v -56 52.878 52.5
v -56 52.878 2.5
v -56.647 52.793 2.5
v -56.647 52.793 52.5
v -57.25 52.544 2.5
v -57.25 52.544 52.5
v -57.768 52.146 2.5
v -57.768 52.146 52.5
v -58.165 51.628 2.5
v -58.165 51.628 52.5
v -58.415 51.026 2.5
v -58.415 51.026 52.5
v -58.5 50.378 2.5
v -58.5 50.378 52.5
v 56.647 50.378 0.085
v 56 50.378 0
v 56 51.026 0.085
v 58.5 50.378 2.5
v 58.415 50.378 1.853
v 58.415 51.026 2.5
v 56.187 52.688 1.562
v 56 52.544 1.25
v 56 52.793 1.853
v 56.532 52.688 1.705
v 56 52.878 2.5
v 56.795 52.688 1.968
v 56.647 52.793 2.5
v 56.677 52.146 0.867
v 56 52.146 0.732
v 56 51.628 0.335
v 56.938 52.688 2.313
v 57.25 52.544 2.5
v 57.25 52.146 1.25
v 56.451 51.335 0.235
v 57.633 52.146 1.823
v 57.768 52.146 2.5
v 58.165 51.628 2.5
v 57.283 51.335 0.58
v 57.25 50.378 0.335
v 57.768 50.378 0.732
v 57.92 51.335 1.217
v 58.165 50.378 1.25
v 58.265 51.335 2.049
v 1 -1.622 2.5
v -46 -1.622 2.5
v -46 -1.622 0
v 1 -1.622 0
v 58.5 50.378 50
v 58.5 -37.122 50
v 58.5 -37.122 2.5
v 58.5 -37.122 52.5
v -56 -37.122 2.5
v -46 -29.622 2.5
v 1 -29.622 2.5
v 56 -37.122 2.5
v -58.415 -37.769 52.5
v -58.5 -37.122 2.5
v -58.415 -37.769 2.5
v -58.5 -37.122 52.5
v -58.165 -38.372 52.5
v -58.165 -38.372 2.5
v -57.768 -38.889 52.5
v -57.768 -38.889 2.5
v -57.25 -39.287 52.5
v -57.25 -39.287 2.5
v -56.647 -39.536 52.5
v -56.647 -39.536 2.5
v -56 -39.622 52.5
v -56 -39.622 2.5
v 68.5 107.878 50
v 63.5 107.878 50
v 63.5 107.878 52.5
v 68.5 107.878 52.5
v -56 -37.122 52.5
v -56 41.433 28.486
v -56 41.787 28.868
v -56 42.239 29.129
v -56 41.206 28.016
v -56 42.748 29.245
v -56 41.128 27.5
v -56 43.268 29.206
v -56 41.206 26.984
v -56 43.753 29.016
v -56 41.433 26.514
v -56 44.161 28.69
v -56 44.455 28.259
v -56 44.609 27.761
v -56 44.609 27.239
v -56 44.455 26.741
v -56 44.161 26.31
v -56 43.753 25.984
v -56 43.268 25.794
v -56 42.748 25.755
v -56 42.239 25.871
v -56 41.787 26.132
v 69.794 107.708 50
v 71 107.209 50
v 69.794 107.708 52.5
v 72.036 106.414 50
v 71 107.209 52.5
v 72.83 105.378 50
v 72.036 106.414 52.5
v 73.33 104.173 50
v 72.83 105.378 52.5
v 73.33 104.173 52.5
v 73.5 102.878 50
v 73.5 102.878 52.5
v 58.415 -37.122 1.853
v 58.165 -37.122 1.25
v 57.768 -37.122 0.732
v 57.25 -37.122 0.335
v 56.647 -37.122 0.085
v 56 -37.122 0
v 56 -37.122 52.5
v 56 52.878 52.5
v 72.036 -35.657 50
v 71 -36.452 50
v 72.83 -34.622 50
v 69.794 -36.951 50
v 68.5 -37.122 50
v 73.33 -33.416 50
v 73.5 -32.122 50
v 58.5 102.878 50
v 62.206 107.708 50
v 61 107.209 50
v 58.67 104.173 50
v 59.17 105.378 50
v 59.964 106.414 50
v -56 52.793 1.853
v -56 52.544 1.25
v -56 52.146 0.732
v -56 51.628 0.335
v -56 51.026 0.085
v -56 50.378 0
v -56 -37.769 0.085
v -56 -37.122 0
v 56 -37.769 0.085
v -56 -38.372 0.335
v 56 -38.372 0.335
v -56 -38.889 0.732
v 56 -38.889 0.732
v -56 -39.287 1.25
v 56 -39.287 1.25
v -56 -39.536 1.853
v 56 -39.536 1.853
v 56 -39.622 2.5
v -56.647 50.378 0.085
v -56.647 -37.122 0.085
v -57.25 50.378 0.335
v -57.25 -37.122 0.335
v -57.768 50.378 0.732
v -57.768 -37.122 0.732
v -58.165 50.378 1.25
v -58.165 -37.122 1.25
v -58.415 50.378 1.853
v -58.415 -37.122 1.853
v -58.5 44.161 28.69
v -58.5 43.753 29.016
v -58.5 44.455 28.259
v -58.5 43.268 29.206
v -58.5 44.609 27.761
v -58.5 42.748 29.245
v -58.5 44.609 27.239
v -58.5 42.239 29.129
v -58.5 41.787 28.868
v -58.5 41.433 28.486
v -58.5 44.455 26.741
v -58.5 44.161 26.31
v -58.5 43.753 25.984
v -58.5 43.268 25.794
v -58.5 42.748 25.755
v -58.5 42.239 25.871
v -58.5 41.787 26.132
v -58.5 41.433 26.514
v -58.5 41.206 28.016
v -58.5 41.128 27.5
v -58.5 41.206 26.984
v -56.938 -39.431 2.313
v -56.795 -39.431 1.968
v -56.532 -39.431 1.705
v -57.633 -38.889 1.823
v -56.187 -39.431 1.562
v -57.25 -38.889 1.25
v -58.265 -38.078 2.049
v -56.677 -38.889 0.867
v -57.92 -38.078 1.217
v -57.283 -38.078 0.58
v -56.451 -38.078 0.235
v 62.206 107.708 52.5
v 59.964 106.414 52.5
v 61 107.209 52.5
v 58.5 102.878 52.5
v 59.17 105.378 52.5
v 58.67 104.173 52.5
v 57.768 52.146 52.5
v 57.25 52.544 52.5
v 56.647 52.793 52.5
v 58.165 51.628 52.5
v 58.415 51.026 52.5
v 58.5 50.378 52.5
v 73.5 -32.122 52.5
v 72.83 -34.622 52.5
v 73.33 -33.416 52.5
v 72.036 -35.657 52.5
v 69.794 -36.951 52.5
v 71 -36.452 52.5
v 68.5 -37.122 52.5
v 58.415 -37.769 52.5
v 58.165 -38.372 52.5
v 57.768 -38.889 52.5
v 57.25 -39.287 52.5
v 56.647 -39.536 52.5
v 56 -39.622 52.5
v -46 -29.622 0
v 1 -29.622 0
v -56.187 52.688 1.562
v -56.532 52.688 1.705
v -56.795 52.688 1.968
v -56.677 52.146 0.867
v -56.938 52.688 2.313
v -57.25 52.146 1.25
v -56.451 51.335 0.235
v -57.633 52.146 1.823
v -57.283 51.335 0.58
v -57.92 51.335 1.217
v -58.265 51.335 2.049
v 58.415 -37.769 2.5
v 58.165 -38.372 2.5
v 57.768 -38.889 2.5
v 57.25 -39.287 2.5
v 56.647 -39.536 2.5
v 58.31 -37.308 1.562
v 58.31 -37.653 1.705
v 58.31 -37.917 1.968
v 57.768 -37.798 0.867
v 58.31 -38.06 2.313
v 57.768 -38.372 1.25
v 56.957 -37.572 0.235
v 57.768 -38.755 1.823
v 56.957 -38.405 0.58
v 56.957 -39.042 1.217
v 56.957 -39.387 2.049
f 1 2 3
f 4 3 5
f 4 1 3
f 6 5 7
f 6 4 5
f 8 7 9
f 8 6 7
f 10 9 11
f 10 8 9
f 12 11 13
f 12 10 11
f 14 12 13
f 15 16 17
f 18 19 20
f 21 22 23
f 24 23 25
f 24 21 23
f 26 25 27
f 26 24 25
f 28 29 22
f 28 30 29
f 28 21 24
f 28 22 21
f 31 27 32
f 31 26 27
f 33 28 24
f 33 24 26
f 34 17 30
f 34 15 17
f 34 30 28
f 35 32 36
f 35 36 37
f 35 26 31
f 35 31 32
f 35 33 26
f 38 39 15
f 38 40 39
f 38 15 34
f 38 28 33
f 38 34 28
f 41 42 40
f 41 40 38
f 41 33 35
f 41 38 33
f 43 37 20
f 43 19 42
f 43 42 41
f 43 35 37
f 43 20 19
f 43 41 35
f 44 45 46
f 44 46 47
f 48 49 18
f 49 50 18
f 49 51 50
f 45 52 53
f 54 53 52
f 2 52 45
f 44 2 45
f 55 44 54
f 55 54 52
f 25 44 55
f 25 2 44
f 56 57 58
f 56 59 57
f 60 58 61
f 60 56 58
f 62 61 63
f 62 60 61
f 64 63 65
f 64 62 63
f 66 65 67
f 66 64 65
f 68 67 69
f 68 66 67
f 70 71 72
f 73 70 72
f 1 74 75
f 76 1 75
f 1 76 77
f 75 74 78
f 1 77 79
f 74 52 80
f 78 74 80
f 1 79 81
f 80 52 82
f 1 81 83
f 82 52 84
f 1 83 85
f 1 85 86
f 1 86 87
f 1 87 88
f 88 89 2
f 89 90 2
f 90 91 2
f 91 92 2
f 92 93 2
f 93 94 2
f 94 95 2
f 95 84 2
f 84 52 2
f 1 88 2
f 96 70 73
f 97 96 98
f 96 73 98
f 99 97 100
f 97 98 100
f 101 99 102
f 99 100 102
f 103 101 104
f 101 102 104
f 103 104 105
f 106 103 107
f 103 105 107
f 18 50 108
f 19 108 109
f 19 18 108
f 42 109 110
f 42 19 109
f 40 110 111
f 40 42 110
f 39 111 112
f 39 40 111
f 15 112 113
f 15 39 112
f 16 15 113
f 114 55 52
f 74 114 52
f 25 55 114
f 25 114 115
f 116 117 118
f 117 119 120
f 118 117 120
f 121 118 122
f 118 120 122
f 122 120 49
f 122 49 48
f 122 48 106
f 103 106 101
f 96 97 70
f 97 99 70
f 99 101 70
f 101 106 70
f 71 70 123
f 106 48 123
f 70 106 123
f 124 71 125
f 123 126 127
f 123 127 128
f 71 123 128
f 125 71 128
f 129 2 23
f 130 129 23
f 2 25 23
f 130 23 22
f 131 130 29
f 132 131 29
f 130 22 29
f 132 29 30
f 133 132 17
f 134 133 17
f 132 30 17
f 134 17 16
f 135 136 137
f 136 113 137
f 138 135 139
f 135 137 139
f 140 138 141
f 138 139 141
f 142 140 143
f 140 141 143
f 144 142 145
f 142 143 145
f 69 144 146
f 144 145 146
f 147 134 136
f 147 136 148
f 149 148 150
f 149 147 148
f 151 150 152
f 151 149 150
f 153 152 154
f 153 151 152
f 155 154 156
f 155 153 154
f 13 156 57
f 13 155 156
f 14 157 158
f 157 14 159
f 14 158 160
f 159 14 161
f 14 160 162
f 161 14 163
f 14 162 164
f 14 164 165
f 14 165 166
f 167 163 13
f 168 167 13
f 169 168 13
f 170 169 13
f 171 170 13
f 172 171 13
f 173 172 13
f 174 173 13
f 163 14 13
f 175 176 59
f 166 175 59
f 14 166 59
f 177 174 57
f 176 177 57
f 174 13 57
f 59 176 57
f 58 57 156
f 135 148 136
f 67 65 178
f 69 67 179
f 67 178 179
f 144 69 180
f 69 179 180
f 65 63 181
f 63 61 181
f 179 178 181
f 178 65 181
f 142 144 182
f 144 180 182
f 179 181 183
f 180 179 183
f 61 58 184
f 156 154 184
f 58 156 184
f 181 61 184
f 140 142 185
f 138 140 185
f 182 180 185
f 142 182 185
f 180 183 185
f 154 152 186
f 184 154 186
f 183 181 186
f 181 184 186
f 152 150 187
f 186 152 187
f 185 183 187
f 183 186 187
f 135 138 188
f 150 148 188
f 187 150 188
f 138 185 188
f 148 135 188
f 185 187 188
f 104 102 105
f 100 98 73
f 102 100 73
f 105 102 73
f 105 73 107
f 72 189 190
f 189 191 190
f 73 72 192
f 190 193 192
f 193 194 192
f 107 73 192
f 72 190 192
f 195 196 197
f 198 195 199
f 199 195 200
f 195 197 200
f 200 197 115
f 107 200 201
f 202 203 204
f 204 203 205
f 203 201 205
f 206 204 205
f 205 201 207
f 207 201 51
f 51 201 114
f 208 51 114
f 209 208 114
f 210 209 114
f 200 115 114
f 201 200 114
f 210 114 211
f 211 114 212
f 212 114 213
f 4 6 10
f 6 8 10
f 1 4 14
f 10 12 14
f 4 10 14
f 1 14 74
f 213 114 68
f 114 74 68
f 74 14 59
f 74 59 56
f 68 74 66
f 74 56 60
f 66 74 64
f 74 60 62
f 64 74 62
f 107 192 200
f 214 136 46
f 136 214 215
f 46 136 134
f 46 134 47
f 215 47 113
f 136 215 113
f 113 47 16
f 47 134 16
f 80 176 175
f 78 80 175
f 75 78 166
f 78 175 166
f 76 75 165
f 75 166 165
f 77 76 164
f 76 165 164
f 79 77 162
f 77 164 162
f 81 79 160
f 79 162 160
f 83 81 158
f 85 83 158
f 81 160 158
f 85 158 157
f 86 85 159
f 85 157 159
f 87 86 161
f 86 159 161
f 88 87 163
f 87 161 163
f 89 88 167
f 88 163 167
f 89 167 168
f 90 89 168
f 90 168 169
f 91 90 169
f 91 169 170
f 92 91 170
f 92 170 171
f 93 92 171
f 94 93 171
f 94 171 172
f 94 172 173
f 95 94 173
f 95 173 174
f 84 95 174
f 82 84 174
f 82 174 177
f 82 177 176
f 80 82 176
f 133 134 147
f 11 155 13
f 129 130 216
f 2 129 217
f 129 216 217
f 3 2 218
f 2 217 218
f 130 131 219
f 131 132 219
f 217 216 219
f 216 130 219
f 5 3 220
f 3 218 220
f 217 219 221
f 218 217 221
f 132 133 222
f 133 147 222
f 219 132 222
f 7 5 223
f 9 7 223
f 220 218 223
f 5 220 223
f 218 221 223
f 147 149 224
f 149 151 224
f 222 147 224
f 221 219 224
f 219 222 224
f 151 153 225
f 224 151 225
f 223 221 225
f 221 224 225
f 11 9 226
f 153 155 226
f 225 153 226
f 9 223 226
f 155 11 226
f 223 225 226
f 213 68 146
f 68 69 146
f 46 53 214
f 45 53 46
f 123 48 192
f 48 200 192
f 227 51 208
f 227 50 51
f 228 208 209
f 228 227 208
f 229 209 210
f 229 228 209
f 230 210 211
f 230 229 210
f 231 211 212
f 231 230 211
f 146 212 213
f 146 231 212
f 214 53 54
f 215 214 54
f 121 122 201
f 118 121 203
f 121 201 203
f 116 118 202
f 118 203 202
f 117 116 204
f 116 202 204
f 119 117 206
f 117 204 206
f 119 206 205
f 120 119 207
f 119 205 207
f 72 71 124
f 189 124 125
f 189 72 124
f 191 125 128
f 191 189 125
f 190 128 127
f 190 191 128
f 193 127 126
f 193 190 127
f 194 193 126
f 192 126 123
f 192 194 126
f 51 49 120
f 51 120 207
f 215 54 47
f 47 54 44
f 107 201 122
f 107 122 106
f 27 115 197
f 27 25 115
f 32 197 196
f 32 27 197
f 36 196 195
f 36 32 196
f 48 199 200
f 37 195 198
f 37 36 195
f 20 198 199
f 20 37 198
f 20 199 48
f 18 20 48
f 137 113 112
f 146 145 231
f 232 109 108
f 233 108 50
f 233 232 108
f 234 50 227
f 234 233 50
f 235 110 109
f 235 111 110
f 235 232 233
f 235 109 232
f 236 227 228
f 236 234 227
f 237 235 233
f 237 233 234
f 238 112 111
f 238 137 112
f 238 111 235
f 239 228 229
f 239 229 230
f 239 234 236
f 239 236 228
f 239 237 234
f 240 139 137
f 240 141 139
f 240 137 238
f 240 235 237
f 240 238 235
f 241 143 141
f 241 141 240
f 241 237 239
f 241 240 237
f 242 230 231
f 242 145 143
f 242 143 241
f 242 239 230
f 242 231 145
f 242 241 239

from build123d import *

# Parameters (mm, degrees)
F0_W     = 117
F0_H     = 92.5
F1_DEPTH = 2.5
F2_W     = 2.5
F2_H     = 90
F3_DEPTH = 50
F2_W_2   = 47
F2_H_2   = 28
F4_DEPTH = 25
F5_R     = 1.75
F6_DEPTH = 25
F7_R     = 2.49999
F8_W     = 57.49999
F8_H     = 2.5
F8_W_2   = 87.50001
F9_DEPTH = 15
F10_R    = 5


# Not quite as in the source:
# - a fillet or chamfer is up to 0.001 mm smaller than in the source, because OpenCascade refuses the exact size


with BuildPart() as f1:
    # F0 (on Top) → F1 (new body)
    with BuildSketch(Plane.XY):
        with Locations((0, 6.6284866768)):
            Rectangle(F0_W, F0_H)
    extrude(amount=F1_DEPTH)

    # F2 (on face) → F3 (join)
    with BuildSketch(Plane.XY.offset(2.5)):
        with Locations((57.25, 7.8784866768)):
            Rectangle(F2_W, F2_H)
        Polygon((-58.5, -37.1215133232), (-58.5, -39.6215133232), (58.5, -39.6215133232), (58.5, -37.1215133232), (56, -37.1215133232), (-56, -37.1215133232), align=None)
        with Locations((-57.25, 7.8784866768)):
            Rectangle(F2_W, F2_H)
    extrude(amount=F3_DEPTH)

    # F2 (on face) → F4 (cut)
    with BuildSketch(Plane.XY.offset(2.5)):
        with Locations((-22.5, -15.6215133232)):
            Rectangle(F2_W_2, F2_H_2)
    extrude(amount=-F4_DEPTH, mode=Mode.SUBTRACT)

    # F5 (on face) → F6 (cut)
    with BuildSketch(Plane(origin=(-58.5, 0, 0), x_dir=(0, -1, 0), z_dir=(-1, 0, 0))):
        with Locations((-42.8784866768, 27.5)):
            Circle(F5_R)
    extrude(amount=-F6_DEPTH, mode=Mode.SUBTRACT)

    # F7 (radius 2.5 in the source; OpenCascade refuses exactly that, so slightly less here)
    f7_edges = [f1.edges().sort_by_distance(p)[0] for p in [
        (-58.5, 6.628487, 0),
        (-58.5, -39.621513, 26.25),
        (0, -39.621513, 0),
        (58.5, 6.628487, 0),
        (58.5, -39.621513, 26.25),
        (0, 52.878487, 0),
        (-58.5, 52.878487, 26.25),
        (58.5, 52.878487, 26.25),
    ]]
    fillet(f7_edges, radius=F7_R)

    # F8 (on face) → F9 (join)
    with BuildSketch(Plane.YZ.offset(58.5)):
        with Locations((79.1284916768, 51.25)):
            Rectangle(F8_W, F8_H)
        with Locations((6.6284916768, 51.25)):
            Rectangle(F8_W_2, F8_H)
    extrude(amount=F9_DEPTH)

    # F10
    f10_edges = [f1.edges().sort_by_distance(p)[0] for p in [
        (73.5, 107.878487, 51.25),
        (58.5, 107.878487, 51.25),
        (73.5, -37.121513, 51.25),
    ]]
    fillet(f10_edges, radius=F10_R)


solid = f1.part
